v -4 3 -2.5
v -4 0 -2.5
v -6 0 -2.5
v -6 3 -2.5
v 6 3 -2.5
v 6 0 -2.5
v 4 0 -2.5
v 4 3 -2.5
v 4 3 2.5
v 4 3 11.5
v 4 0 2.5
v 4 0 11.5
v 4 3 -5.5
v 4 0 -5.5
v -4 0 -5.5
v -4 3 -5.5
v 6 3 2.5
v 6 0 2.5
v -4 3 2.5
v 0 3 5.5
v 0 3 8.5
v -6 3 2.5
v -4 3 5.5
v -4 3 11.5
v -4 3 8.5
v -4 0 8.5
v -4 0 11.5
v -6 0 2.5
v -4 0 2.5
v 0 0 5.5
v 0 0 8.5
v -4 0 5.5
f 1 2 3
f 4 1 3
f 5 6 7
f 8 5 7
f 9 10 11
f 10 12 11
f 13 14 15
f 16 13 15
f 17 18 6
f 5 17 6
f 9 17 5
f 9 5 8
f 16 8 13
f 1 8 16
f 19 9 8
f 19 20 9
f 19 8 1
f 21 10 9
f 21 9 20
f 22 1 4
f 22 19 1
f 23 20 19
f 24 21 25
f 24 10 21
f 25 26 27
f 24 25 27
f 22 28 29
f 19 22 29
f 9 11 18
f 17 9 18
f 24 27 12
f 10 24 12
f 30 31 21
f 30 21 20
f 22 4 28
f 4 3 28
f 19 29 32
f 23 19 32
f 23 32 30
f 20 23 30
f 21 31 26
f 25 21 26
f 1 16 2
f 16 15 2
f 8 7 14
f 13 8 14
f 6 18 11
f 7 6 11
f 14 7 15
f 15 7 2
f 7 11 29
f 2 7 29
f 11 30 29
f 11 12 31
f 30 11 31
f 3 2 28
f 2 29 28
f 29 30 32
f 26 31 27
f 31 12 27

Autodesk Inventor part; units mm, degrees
ref_plane "YZ Plane" through (0, 0, 0) normal (1, 0, 0) x (0, 1, 0)
ref_plane "XZ Plane" through (0, 0, 0) normal (0, 1, 0) x (-1, 0, 0)
ref_plane "XY Plane" through (0, 0, 0) normal (0, 0, 1) x (1, 0, 0)
sketch "草圖1" plane through (0, 0, 0) normal (0, 1, 0) x (-1, 0, 0)
  line L0 (4, 11.5) -> (-4, 11.5)
  line L1 (-4, -5.5) -> (4, -5.5)
  line L2 (-6, 2.5) -> (-6, -2.5)
  line L3 (6, -2.5) -> (6, 2.5)
  line L4 (6, 2.5) -> (4, 2.5)
  line L5 (-4, 2.5) -> (-6, 2.5)
  line L6 (4, -5.5) -> (4, -2.5)
  line L7 (-6, -2.5) -> (-4, -2.5)
  line L8 (4, -2.5) -> (6, -2.5)
  line L9 (-4, 11.5) -> (-4, 2.5)
  line L10 (-4, -2.5) -> (-4, -5.5)
  line L11 (0, 14.8546) -> (0, -17.157)
  line L12 (13.4413, 0) -> (-16.1444, 0)
  line L13 (4, 5.5) -> (0, 5.5)
  line L14 (0, 5.5) -> (0, 8.5)
  line L15 (0, 8.5) -> (4, 8.5)
  line L16 (4, 2.5) -> (4, 5.5)
  line L17 (4, 8.5) -> (4, 11.5)
  point P0 (0, 0)
  point P1 (-6, 0)
  point P2 (6, 0)
  dimension "d0" = 8
  dimension "d3" = 5
  dimension "d5" = 12
  dimension "d8" = 3
  dimension "d9" = 9
  dimension "d10" = 3
  dimension "d11" = 3
extrude "擠出1" add sketch "草圖1" along normal blind 3
properties part number "plug" material "木材 (楓木)"
